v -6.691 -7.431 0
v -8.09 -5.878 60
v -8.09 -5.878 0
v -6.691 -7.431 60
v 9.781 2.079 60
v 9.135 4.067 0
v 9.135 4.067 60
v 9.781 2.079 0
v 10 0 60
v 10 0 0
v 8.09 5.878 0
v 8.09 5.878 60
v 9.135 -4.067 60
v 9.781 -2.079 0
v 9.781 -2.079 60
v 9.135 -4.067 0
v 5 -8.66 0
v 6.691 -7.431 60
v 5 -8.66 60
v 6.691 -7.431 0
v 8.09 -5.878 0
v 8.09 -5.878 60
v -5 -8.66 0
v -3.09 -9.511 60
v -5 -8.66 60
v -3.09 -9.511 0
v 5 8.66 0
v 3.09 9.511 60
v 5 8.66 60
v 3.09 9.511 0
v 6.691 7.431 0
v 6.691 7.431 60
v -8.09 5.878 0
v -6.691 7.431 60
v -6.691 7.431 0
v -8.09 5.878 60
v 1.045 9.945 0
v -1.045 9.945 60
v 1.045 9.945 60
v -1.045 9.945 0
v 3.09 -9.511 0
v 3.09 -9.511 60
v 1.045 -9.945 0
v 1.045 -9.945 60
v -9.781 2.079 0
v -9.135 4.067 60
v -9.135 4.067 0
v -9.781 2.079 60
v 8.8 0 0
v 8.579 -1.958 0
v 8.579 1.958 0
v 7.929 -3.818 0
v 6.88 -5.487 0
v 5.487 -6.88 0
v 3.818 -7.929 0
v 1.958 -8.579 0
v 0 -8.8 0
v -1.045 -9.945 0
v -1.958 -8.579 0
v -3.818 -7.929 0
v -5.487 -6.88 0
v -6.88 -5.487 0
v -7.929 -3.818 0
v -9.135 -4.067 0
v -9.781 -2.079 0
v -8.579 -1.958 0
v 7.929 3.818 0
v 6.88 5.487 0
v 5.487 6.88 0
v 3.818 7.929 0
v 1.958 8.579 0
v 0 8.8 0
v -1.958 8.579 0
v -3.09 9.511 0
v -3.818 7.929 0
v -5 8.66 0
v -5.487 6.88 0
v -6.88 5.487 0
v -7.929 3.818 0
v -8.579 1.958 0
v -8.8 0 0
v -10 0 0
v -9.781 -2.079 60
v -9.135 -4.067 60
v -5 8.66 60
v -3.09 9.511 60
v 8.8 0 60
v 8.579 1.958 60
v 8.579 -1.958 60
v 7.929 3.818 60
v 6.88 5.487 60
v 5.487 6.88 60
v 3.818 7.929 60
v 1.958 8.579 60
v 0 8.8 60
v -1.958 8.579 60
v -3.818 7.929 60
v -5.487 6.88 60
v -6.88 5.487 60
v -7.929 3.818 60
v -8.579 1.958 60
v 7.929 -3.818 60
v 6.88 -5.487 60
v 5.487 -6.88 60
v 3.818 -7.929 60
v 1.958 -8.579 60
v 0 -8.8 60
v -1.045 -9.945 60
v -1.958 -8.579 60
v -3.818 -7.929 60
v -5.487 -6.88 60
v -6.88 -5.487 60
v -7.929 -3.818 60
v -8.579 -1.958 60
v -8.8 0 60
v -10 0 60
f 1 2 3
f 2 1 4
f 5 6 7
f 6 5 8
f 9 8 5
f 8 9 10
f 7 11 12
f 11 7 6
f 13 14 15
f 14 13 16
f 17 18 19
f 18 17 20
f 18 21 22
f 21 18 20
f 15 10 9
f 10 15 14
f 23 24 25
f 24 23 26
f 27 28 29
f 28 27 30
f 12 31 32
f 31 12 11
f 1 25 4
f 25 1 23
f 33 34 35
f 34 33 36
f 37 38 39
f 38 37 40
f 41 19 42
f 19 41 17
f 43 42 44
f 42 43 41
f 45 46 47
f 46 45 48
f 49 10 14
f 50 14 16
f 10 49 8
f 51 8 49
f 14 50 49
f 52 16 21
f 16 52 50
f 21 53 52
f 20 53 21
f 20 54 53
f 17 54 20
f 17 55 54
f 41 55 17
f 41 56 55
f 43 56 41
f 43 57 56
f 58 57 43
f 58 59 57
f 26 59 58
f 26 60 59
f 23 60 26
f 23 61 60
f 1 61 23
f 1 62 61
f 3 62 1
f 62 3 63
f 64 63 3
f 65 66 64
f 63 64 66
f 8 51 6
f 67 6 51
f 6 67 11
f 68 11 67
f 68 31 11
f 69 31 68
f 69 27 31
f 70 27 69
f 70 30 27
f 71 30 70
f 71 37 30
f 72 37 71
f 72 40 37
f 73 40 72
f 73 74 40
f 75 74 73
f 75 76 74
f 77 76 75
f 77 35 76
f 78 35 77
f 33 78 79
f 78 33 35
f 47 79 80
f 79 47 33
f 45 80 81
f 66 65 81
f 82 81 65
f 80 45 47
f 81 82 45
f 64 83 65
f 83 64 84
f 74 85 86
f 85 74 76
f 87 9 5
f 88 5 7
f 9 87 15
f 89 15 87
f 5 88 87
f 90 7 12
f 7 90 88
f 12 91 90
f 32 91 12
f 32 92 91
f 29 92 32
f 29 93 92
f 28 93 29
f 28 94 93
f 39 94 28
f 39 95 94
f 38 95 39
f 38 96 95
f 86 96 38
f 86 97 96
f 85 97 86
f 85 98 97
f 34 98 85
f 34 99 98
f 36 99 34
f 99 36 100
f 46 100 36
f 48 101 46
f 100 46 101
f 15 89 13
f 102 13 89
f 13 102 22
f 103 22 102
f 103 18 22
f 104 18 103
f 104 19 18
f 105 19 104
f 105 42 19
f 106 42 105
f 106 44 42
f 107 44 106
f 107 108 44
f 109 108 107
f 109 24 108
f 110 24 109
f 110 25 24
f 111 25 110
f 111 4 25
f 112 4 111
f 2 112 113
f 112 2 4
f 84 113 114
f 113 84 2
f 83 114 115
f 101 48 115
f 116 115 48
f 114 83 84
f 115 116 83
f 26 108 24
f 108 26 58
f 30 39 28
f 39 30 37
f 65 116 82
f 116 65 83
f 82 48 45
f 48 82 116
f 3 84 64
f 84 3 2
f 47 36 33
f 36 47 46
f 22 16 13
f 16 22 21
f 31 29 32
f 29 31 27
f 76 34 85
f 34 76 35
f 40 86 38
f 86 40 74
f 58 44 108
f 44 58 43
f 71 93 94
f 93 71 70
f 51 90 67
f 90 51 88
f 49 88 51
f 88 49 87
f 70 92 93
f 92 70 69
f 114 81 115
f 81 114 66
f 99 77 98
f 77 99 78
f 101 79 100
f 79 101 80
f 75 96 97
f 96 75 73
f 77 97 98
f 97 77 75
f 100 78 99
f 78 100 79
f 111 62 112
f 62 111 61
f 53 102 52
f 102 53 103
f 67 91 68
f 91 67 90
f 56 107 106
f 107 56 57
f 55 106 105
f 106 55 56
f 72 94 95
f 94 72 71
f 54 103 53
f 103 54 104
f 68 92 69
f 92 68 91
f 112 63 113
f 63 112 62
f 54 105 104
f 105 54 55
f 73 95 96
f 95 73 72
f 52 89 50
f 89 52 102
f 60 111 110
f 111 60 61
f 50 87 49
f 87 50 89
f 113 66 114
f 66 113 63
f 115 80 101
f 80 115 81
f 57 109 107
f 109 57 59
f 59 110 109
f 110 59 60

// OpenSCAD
handle();
//clip();

module handle() {
  difference() {
    cylinder(r=10,h=60);
    translate([0,0,-0.1]) cylinder(r=8.8,h=80.2);
  }
}

module clip() {
  difference() {
    union() {
      cube([37.4,20,21.2]);
      translate([0,20,10]) rotate([90,0,0]) difference() {
        cylinder(r=10,h=20);
        translate([0,0,-0.1]) cylinder(r=10-1.2,h=20.2);
      }
    }
    translate([1.2,-0.1,-0.1]) cube([35,35.2,20.1]);
  }
}
